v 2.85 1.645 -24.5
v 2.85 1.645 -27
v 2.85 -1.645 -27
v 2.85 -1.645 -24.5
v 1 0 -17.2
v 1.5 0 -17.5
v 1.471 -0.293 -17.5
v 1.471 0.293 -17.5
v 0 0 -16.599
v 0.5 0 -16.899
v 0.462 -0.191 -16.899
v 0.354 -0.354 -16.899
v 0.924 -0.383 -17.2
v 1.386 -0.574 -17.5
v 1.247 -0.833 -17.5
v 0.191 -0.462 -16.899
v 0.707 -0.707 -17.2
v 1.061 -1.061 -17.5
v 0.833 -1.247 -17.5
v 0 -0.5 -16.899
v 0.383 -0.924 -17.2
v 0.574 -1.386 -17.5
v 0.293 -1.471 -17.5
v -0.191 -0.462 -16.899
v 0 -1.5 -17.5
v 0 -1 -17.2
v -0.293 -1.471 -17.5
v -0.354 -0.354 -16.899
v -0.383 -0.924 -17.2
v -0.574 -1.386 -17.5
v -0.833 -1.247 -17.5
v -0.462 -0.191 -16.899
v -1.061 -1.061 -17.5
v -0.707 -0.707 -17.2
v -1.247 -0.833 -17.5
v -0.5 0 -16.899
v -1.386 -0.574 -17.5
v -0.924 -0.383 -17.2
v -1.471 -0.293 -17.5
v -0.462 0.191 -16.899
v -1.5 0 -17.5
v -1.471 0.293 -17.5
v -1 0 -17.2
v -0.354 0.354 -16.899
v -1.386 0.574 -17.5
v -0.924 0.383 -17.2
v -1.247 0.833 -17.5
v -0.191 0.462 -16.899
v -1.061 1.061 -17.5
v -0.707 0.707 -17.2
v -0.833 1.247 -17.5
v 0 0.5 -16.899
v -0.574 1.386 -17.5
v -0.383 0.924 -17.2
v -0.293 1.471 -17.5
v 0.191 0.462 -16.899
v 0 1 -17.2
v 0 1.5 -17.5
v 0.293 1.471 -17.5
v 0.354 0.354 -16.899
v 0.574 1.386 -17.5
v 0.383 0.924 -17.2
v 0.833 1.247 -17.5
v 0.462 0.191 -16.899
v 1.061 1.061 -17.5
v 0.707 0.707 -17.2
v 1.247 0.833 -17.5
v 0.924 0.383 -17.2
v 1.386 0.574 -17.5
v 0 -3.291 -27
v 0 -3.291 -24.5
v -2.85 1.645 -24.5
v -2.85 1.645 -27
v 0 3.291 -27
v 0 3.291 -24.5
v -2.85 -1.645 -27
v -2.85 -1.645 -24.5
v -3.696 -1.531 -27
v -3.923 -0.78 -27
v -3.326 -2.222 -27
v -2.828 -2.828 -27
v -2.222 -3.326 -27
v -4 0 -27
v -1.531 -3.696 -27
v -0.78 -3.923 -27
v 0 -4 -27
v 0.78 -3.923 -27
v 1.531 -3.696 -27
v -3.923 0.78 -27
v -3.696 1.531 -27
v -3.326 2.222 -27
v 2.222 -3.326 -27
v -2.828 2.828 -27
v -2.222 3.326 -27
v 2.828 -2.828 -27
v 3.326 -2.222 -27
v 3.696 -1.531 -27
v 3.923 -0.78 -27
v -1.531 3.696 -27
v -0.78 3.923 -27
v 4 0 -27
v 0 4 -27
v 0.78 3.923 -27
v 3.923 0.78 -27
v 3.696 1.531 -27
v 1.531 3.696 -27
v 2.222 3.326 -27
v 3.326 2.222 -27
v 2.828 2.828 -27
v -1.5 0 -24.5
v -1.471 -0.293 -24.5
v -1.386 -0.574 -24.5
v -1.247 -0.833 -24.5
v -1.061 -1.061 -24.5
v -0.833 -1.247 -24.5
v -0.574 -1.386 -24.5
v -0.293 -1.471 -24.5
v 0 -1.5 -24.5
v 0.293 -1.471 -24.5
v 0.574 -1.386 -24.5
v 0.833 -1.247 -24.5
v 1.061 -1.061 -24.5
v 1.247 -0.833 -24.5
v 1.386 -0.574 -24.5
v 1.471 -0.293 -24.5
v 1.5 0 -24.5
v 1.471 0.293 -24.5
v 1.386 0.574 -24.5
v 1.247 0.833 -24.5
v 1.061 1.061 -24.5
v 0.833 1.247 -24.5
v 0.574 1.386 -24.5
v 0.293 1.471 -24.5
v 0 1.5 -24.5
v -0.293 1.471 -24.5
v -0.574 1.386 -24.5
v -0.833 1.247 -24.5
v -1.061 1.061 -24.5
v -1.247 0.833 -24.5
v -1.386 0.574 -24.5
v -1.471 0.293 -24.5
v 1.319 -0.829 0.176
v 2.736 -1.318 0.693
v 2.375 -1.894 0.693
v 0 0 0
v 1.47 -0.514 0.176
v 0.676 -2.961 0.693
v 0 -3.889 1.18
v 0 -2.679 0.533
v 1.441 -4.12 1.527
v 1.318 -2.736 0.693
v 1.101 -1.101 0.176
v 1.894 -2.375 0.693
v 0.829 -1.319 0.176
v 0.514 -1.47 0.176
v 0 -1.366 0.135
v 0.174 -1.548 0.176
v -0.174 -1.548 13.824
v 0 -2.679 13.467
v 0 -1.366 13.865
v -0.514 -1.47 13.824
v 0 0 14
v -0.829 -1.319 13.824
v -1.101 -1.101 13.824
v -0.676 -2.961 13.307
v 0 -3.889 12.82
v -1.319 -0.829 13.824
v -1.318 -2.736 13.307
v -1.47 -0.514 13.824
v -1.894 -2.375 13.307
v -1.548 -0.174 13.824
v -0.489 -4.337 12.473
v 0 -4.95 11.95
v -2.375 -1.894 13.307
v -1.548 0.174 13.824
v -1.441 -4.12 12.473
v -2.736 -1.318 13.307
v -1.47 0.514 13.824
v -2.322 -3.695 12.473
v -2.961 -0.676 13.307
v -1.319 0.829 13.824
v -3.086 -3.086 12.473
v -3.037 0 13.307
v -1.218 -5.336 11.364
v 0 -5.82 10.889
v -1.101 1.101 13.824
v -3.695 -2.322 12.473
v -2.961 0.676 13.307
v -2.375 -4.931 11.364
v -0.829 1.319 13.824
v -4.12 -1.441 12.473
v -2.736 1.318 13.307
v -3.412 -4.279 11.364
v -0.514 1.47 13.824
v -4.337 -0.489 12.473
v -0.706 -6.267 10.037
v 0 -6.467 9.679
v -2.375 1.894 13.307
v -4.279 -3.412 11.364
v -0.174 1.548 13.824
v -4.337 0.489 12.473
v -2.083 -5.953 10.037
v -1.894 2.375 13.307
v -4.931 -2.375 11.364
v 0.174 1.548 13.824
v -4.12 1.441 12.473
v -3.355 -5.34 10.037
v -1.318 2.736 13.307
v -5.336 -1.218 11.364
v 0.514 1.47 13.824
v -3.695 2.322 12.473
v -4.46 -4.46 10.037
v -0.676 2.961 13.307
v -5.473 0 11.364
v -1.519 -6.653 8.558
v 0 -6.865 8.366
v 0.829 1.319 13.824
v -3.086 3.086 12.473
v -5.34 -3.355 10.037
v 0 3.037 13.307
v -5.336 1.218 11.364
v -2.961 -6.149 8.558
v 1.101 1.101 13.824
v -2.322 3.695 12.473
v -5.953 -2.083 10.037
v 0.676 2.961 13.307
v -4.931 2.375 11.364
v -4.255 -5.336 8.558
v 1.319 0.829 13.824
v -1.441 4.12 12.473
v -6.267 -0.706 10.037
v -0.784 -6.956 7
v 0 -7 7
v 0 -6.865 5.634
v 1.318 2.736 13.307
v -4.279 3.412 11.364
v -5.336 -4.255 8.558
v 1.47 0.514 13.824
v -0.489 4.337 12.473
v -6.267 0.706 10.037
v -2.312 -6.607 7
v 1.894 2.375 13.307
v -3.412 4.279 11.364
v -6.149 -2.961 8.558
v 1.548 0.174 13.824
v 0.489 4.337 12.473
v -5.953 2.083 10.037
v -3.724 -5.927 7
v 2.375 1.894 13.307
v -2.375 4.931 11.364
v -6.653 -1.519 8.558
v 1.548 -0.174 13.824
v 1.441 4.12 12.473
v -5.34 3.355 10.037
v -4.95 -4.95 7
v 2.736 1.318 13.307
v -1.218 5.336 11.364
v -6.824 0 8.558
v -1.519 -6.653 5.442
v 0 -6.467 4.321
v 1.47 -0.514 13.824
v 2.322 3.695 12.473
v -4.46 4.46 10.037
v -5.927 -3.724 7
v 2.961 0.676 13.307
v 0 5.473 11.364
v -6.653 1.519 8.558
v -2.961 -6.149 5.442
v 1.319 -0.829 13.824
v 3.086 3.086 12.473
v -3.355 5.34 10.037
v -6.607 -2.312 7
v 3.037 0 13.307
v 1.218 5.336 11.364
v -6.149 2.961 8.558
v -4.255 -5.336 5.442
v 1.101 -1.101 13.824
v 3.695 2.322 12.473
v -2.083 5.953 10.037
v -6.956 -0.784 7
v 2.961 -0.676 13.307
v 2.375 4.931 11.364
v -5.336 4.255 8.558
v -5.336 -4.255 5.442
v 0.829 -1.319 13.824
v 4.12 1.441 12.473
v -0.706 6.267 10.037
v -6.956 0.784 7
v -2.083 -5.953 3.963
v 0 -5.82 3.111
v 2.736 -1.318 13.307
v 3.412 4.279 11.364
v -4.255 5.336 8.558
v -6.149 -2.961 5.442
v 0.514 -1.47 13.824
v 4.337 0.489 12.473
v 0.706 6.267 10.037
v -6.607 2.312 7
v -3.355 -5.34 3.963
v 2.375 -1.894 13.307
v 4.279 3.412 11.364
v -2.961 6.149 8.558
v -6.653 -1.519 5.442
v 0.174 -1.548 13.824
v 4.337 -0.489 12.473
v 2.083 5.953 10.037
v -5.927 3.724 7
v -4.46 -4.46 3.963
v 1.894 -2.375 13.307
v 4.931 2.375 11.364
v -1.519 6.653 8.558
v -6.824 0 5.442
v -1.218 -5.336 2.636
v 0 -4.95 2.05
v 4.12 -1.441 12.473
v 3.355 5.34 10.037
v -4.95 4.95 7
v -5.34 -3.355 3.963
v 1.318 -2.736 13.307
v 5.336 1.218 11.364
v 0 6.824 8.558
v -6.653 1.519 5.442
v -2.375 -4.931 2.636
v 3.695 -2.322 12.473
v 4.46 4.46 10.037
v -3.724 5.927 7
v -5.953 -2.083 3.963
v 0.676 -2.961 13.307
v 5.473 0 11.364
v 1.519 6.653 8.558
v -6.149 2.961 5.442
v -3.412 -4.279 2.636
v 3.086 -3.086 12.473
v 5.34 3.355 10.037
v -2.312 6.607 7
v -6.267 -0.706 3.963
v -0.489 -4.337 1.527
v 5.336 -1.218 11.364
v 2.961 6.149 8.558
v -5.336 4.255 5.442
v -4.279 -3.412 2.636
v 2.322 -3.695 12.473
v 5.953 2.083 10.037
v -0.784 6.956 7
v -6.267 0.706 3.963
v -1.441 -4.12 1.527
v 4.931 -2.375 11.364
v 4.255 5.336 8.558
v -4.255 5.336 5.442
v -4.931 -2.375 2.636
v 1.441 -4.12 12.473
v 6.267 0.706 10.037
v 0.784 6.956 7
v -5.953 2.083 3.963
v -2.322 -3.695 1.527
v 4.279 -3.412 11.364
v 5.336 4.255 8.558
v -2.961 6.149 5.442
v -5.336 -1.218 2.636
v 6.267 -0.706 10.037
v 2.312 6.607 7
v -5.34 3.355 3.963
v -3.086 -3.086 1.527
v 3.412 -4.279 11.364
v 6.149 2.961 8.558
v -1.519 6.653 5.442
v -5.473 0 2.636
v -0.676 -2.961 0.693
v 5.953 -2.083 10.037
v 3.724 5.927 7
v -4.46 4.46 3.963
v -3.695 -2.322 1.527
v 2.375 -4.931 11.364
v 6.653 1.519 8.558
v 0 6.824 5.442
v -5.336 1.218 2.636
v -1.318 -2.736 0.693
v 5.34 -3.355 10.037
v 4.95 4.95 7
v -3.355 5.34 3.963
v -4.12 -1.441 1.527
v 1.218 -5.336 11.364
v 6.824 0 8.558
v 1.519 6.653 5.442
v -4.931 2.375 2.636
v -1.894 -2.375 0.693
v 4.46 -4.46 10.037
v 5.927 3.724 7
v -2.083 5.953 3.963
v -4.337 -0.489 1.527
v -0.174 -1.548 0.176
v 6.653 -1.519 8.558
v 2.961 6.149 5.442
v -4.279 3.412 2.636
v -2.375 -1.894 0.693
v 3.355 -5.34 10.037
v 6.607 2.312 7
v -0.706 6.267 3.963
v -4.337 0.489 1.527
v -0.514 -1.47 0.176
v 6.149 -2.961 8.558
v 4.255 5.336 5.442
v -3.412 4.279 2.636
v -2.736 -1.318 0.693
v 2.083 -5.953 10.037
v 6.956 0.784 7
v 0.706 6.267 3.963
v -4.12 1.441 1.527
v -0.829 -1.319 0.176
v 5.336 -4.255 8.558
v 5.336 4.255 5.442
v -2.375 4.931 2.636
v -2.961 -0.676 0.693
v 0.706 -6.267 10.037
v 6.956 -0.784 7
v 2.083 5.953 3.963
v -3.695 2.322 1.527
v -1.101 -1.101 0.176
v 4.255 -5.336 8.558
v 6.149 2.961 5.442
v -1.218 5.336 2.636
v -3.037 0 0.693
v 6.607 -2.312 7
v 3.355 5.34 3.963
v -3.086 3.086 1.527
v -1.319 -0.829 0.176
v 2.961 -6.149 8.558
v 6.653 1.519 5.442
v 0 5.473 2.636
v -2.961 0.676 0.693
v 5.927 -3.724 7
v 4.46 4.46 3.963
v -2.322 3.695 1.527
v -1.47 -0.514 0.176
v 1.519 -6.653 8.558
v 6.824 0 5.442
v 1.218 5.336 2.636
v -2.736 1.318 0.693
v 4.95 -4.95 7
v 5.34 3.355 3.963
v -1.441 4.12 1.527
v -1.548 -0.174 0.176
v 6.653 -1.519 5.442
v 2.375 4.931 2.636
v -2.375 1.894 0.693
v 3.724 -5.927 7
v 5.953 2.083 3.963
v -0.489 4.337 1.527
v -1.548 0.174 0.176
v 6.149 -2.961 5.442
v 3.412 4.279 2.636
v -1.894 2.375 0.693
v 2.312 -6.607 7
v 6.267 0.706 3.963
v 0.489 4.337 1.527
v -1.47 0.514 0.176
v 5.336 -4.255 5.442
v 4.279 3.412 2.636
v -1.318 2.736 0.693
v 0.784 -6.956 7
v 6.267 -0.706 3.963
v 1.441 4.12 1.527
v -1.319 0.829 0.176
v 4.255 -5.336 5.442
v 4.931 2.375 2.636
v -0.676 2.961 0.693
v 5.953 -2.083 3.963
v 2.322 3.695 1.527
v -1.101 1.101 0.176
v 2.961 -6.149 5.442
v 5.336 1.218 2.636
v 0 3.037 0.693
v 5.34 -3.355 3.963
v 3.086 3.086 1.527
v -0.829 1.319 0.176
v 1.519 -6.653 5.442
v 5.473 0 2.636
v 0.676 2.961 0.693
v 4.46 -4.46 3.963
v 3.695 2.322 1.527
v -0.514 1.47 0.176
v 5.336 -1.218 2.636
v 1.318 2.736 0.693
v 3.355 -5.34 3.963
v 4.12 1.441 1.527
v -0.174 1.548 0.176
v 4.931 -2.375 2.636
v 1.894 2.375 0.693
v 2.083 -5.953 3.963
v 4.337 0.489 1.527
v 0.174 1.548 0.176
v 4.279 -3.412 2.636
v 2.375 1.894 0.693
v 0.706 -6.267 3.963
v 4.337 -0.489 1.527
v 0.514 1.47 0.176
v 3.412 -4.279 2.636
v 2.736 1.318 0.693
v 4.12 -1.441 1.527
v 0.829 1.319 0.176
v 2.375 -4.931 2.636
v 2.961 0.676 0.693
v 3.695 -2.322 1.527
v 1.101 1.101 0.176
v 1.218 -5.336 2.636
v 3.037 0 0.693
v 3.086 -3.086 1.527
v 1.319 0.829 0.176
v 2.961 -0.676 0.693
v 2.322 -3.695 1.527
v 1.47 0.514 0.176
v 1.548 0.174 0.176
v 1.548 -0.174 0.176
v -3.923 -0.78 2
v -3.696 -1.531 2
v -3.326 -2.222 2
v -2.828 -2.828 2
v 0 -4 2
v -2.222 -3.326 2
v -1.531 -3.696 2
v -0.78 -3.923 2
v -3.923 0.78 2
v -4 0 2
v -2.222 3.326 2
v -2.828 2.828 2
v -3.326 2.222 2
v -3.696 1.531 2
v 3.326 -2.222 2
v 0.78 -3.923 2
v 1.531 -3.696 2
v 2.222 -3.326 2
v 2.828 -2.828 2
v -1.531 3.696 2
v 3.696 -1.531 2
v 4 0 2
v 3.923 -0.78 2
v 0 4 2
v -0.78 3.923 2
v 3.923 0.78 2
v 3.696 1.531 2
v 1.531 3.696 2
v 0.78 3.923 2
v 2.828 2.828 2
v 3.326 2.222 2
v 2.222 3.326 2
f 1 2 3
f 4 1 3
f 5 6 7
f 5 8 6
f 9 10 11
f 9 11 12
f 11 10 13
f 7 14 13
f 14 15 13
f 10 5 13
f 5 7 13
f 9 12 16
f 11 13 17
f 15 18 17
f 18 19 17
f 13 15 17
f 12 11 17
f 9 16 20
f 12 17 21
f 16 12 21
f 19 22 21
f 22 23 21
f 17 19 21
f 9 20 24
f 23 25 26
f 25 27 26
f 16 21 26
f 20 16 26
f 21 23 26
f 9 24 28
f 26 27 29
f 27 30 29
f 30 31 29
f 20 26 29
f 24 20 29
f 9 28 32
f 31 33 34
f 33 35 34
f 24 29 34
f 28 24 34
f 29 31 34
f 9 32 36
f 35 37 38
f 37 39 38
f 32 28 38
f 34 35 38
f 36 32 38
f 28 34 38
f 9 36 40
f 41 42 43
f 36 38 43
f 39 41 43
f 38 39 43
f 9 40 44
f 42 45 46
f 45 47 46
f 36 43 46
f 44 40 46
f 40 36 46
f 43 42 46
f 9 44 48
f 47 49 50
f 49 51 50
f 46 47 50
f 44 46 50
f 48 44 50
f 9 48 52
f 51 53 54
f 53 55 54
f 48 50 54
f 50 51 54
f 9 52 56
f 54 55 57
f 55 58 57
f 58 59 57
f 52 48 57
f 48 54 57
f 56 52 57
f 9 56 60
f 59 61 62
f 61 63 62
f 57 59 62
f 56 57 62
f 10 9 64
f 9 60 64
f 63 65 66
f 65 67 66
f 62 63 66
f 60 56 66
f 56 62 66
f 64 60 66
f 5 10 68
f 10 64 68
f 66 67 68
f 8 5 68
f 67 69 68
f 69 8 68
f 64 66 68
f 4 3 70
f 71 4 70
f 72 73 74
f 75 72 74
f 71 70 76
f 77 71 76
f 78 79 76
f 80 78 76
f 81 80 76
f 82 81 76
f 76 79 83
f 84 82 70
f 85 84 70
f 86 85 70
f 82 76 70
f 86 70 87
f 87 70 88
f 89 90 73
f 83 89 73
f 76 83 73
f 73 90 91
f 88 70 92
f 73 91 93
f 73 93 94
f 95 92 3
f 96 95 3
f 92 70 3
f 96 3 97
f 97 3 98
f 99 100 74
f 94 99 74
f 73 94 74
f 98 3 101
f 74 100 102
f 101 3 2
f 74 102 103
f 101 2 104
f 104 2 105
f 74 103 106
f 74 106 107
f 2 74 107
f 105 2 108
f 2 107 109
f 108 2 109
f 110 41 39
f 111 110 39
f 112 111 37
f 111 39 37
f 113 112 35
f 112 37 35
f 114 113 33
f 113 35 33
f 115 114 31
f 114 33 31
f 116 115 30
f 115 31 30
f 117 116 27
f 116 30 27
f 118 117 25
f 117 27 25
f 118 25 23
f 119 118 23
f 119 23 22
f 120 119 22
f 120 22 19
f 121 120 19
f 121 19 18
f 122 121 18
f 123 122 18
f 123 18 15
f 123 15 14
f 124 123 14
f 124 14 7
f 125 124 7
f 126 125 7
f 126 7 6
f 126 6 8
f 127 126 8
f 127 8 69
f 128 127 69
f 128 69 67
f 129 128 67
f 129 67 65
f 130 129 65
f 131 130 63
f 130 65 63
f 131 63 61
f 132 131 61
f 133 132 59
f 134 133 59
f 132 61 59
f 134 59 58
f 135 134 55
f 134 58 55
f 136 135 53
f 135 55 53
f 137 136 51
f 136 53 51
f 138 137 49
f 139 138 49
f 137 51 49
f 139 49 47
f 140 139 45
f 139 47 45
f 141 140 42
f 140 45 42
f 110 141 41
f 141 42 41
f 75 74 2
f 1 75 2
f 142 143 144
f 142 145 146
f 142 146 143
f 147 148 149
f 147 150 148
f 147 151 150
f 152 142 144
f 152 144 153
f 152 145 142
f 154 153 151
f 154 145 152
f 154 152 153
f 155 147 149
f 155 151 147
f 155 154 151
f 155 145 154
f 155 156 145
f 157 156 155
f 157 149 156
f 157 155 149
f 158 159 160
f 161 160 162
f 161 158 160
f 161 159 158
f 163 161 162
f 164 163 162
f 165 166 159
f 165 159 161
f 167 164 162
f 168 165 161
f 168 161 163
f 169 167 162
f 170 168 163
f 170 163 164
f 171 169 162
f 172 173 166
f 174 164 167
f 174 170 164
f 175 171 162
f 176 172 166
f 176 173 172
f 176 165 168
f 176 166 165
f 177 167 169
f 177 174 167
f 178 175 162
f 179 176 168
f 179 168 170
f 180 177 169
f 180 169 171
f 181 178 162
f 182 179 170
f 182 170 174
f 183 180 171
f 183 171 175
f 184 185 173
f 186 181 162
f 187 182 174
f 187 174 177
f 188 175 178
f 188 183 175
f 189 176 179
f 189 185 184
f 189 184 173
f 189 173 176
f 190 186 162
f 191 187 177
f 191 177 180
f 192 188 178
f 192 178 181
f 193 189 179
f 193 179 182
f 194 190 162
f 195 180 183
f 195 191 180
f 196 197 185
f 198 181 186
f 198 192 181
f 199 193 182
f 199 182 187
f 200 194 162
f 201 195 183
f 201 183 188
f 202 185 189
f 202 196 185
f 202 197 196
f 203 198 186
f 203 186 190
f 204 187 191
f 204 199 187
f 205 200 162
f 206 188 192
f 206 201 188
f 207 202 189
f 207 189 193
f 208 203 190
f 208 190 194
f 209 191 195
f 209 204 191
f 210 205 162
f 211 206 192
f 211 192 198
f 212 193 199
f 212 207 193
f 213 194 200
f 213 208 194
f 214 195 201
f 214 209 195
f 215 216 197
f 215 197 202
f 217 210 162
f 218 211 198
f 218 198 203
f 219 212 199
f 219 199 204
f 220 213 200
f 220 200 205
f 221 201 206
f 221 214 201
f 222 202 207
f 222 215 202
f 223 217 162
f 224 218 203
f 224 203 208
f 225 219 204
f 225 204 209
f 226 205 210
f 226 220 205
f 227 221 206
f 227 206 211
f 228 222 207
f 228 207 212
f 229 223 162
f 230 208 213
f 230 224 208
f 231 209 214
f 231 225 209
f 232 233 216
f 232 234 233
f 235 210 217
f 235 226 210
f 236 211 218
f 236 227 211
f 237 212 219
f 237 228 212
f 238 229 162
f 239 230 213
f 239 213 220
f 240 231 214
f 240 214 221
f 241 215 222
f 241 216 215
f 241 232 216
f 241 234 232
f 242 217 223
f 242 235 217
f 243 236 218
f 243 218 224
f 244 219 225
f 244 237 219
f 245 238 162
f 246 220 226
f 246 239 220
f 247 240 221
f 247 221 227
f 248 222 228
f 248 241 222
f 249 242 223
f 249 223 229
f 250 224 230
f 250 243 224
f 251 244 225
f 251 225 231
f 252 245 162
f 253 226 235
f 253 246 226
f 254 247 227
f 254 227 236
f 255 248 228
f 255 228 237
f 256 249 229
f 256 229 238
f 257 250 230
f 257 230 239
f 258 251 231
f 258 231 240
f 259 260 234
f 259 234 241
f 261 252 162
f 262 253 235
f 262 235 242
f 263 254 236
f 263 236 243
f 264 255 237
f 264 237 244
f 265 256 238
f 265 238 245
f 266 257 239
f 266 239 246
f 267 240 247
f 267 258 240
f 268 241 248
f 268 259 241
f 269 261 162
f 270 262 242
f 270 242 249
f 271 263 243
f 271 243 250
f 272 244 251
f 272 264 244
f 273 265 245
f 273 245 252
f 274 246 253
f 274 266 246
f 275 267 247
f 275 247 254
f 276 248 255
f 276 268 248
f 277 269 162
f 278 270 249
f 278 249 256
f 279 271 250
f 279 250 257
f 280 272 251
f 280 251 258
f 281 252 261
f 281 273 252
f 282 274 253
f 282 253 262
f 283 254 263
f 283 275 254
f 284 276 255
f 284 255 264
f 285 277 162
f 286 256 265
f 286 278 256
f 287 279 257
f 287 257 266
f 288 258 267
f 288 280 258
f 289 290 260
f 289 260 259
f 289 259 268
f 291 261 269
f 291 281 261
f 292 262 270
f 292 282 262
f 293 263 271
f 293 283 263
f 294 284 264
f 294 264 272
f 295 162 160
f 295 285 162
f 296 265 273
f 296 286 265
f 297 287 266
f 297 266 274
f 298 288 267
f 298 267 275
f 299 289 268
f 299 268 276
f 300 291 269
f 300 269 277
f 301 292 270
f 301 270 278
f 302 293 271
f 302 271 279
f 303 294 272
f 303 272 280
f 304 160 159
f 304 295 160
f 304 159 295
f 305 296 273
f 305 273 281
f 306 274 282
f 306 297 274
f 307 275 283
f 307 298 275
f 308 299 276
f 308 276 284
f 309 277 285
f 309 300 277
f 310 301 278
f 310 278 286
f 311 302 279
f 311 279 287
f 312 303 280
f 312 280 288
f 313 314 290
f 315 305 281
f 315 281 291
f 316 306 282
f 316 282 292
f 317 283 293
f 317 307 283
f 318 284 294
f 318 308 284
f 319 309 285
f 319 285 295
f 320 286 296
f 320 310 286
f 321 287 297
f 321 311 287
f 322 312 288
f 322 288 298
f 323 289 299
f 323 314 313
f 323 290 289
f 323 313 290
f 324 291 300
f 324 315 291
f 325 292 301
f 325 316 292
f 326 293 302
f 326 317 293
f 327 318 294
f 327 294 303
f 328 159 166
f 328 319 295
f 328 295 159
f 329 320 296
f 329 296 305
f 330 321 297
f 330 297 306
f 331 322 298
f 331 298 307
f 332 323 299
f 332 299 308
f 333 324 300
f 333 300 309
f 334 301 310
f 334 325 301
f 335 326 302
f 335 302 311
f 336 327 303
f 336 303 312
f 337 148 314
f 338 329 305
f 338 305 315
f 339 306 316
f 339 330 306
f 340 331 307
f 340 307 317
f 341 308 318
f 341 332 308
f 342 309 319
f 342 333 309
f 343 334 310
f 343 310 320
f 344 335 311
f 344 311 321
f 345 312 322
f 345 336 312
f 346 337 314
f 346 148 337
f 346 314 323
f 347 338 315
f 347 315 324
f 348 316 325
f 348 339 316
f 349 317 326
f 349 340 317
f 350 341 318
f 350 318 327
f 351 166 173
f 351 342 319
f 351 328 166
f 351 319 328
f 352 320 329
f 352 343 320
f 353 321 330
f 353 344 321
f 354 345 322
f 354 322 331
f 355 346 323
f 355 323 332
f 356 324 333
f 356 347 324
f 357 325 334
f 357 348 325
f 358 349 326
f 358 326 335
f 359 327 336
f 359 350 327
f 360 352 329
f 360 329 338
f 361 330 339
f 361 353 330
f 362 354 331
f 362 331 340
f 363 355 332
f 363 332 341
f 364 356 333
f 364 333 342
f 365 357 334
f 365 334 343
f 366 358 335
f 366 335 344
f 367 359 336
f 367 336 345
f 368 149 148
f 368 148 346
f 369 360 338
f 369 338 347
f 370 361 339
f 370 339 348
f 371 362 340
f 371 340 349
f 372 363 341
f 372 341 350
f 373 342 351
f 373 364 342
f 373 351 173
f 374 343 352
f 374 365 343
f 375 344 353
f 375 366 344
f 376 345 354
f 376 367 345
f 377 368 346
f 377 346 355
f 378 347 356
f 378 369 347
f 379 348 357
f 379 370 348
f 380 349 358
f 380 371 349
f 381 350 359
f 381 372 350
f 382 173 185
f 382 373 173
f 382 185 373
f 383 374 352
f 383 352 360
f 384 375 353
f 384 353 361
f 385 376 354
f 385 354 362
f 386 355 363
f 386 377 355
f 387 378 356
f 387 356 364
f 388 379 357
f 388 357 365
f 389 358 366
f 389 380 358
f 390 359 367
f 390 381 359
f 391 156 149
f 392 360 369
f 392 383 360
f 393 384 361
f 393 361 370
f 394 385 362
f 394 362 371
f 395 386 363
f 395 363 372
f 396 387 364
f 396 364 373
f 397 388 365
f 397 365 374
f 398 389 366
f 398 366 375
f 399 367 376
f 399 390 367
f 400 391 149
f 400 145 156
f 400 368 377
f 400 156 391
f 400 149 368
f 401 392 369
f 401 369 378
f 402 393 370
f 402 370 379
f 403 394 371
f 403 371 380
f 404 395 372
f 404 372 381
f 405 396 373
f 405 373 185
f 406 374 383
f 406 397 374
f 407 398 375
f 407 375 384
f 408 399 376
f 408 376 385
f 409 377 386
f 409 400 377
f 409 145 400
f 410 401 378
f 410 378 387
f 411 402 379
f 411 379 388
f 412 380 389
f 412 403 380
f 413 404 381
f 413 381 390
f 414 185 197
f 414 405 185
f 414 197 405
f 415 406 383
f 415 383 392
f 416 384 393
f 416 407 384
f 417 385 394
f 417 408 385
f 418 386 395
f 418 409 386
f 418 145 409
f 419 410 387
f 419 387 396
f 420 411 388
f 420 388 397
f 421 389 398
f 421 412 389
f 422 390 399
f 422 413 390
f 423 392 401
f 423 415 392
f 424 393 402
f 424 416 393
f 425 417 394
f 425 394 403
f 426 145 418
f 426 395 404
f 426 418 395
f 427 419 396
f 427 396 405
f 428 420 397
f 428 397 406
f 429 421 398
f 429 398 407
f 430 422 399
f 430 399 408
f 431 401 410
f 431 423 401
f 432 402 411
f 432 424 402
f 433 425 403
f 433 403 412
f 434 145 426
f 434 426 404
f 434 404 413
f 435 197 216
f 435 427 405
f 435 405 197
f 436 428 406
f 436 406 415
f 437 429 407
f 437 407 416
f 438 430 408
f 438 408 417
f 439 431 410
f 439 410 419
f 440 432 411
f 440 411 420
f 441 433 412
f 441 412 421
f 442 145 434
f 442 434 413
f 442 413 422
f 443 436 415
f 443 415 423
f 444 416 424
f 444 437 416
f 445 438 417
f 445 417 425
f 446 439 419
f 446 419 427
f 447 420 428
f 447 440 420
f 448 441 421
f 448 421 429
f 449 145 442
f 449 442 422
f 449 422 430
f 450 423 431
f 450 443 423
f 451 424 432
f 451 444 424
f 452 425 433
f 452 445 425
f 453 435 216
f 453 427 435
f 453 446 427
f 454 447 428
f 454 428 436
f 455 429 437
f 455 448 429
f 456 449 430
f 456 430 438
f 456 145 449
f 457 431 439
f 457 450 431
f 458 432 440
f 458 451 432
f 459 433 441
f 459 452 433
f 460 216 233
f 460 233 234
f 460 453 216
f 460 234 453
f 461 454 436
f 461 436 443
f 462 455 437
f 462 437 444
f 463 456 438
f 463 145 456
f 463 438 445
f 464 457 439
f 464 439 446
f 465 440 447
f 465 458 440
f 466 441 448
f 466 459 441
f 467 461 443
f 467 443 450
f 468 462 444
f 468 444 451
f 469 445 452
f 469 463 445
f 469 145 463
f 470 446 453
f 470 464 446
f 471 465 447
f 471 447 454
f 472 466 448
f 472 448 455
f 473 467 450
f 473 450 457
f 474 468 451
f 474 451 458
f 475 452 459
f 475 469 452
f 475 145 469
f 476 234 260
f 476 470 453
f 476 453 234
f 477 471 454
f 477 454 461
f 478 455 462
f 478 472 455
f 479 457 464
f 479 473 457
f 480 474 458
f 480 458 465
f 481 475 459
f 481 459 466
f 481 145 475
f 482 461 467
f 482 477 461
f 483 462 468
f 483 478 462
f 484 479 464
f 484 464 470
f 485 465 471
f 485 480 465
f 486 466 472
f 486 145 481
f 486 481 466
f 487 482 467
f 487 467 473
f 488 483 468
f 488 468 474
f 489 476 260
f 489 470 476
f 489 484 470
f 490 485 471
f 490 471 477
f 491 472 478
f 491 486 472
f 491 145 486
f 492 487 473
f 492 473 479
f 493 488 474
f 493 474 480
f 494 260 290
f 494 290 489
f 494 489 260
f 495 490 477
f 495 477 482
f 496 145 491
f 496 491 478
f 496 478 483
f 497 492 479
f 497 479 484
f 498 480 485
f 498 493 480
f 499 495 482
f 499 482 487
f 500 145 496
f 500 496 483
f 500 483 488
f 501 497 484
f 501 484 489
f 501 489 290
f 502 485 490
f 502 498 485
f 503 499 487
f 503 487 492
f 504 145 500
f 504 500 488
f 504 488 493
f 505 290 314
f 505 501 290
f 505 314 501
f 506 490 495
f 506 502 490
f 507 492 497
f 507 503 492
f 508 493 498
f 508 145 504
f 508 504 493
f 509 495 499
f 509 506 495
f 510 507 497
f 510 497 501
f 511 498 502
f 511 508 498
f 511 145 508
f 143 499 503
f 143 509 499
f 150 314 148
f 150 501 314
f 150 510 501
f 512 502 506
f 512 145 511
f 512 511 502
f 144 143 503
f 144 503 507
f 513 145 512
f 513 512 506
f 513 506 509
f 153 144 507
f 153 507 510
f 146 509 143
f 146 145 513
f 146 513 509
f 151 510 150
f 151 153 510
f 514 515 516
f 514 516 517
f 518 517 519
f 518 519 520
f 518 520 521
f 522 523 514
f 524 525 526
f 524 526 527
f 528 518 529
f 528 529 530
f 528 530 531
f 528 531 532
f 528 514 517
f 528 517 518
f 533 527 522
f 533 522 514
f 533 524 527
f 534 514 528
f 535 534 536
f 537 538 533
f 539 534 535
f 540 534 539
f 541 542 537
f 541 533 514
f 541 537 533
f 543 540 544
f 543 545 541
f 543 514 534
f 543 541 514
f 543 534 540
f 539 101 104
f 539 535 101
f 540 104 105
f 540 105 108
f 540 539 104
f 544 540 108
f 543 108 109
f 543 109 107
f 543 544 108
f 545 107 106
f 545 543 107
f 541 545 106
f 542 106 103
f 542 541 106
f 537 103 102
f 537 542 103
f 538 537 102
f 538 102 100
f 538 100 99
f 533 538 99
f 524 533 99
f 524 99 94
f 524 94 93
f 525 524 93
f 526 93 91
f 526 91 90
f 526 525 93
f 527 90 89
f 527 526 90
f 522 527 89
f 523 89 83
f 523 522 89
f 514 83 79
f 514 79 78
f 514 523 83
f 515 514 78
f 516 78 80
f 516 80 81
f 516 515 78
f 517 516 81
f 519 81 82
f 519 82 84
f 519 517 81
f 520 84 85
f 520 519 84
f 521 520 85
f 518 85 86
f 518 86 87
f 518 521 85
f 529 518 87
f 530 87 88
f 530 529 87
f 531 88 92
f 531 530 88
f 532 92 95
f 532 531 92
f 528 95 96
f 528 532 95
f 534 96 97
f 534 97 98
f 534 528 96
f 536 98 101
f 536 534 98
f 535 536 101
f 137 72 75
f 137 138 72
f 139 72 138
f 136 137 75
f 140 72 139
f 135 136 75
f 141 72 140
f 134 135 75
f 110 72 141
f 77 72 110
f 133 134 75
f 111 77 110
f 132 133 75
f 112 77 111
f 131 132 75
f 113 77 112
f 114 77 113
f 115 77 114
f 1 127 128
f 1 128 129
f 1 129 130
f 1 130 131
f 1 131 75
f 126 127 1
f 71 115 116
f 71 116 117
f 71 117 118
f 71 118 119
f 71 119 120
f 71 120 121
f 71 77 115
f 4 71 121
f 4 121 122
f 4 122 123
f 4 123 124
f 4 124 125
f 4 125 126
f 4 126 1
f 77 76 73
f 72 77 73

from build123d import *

# Parameters (mm, degrees)
F0_R           = 4
F1_DEPTH       = 2
F4_DEPTH       = 25
F6_D           = 3
F6_DEPTH       = 9.5
F6_CBORE_D     = 3
F6_CBORE_DEPTH = 9.5
F6_TIP         = 0.9012909285
F8_DEPTH       = 2.5


with BuildPart() as f1:
    # F0 (on Top) → F1 (new body, symmetric)
    with BuildSketch(Plane.XY):
        Circle(F0_R)
    extrude(amount=F1_DEPTH, both=True)

    # F4 (add): a face of the model
    f4_faces = [f1.faces().sort_by_distance(p)[0] for p in [
        (0, 0, -2),
    ]]
    extrude(f4_faces, amount=F4_DEPTH)

    # F6
    with Locations(Plane(origin=(0, 0, -27), x_dir=(1, 0, 0), z_dir=(0, 0, -1))):
        with Locations((0, 0)):
            CounterBoreHole(F6_D / 2, F6_CBORE_D / 2, F6_CBORE_DEPTH, depth=F6_DEPTH)
            with Locations((0, 0, -(F6_DEPTH + F6_TIP / 2))):  # 118° drill point
                Cone(0, F6_D / 2, F6_TIP, mode=Mode.SUBTRACT)

    # F7 (on face) → F8 (cut)
    with BuildSketch(Plane(origin=(0, 0, -27), x_dir=(1, 0, 0), z_dir=(0, 0, -1))):
        Polygon((2.85, -1.6454482672), (2.85, 1.6454482672), (0, 3.2908965344), (-2.85, 1.6454482672), (-2.85, -1.6454482672), (0, -3.2908965344), align=None)
    extrude(amount=-F8_DEPTH, mode=Mode.SUBTRACT)


with BuildPart() as f3:
    # F2 (on Right) → F3 (revolve)
    with BuildSketch(Plane.YZ):
        with BuildLine():
            Line((0, 0), (0, 14))
            ThreePointArc((0, 14), (-7, 7), (0, 0))
        make_face()
    revolve(axis=Axis((0, 0, 7.2875723417), (0, 0, -1)))


solid = Compound([f1.part, f3.part])
